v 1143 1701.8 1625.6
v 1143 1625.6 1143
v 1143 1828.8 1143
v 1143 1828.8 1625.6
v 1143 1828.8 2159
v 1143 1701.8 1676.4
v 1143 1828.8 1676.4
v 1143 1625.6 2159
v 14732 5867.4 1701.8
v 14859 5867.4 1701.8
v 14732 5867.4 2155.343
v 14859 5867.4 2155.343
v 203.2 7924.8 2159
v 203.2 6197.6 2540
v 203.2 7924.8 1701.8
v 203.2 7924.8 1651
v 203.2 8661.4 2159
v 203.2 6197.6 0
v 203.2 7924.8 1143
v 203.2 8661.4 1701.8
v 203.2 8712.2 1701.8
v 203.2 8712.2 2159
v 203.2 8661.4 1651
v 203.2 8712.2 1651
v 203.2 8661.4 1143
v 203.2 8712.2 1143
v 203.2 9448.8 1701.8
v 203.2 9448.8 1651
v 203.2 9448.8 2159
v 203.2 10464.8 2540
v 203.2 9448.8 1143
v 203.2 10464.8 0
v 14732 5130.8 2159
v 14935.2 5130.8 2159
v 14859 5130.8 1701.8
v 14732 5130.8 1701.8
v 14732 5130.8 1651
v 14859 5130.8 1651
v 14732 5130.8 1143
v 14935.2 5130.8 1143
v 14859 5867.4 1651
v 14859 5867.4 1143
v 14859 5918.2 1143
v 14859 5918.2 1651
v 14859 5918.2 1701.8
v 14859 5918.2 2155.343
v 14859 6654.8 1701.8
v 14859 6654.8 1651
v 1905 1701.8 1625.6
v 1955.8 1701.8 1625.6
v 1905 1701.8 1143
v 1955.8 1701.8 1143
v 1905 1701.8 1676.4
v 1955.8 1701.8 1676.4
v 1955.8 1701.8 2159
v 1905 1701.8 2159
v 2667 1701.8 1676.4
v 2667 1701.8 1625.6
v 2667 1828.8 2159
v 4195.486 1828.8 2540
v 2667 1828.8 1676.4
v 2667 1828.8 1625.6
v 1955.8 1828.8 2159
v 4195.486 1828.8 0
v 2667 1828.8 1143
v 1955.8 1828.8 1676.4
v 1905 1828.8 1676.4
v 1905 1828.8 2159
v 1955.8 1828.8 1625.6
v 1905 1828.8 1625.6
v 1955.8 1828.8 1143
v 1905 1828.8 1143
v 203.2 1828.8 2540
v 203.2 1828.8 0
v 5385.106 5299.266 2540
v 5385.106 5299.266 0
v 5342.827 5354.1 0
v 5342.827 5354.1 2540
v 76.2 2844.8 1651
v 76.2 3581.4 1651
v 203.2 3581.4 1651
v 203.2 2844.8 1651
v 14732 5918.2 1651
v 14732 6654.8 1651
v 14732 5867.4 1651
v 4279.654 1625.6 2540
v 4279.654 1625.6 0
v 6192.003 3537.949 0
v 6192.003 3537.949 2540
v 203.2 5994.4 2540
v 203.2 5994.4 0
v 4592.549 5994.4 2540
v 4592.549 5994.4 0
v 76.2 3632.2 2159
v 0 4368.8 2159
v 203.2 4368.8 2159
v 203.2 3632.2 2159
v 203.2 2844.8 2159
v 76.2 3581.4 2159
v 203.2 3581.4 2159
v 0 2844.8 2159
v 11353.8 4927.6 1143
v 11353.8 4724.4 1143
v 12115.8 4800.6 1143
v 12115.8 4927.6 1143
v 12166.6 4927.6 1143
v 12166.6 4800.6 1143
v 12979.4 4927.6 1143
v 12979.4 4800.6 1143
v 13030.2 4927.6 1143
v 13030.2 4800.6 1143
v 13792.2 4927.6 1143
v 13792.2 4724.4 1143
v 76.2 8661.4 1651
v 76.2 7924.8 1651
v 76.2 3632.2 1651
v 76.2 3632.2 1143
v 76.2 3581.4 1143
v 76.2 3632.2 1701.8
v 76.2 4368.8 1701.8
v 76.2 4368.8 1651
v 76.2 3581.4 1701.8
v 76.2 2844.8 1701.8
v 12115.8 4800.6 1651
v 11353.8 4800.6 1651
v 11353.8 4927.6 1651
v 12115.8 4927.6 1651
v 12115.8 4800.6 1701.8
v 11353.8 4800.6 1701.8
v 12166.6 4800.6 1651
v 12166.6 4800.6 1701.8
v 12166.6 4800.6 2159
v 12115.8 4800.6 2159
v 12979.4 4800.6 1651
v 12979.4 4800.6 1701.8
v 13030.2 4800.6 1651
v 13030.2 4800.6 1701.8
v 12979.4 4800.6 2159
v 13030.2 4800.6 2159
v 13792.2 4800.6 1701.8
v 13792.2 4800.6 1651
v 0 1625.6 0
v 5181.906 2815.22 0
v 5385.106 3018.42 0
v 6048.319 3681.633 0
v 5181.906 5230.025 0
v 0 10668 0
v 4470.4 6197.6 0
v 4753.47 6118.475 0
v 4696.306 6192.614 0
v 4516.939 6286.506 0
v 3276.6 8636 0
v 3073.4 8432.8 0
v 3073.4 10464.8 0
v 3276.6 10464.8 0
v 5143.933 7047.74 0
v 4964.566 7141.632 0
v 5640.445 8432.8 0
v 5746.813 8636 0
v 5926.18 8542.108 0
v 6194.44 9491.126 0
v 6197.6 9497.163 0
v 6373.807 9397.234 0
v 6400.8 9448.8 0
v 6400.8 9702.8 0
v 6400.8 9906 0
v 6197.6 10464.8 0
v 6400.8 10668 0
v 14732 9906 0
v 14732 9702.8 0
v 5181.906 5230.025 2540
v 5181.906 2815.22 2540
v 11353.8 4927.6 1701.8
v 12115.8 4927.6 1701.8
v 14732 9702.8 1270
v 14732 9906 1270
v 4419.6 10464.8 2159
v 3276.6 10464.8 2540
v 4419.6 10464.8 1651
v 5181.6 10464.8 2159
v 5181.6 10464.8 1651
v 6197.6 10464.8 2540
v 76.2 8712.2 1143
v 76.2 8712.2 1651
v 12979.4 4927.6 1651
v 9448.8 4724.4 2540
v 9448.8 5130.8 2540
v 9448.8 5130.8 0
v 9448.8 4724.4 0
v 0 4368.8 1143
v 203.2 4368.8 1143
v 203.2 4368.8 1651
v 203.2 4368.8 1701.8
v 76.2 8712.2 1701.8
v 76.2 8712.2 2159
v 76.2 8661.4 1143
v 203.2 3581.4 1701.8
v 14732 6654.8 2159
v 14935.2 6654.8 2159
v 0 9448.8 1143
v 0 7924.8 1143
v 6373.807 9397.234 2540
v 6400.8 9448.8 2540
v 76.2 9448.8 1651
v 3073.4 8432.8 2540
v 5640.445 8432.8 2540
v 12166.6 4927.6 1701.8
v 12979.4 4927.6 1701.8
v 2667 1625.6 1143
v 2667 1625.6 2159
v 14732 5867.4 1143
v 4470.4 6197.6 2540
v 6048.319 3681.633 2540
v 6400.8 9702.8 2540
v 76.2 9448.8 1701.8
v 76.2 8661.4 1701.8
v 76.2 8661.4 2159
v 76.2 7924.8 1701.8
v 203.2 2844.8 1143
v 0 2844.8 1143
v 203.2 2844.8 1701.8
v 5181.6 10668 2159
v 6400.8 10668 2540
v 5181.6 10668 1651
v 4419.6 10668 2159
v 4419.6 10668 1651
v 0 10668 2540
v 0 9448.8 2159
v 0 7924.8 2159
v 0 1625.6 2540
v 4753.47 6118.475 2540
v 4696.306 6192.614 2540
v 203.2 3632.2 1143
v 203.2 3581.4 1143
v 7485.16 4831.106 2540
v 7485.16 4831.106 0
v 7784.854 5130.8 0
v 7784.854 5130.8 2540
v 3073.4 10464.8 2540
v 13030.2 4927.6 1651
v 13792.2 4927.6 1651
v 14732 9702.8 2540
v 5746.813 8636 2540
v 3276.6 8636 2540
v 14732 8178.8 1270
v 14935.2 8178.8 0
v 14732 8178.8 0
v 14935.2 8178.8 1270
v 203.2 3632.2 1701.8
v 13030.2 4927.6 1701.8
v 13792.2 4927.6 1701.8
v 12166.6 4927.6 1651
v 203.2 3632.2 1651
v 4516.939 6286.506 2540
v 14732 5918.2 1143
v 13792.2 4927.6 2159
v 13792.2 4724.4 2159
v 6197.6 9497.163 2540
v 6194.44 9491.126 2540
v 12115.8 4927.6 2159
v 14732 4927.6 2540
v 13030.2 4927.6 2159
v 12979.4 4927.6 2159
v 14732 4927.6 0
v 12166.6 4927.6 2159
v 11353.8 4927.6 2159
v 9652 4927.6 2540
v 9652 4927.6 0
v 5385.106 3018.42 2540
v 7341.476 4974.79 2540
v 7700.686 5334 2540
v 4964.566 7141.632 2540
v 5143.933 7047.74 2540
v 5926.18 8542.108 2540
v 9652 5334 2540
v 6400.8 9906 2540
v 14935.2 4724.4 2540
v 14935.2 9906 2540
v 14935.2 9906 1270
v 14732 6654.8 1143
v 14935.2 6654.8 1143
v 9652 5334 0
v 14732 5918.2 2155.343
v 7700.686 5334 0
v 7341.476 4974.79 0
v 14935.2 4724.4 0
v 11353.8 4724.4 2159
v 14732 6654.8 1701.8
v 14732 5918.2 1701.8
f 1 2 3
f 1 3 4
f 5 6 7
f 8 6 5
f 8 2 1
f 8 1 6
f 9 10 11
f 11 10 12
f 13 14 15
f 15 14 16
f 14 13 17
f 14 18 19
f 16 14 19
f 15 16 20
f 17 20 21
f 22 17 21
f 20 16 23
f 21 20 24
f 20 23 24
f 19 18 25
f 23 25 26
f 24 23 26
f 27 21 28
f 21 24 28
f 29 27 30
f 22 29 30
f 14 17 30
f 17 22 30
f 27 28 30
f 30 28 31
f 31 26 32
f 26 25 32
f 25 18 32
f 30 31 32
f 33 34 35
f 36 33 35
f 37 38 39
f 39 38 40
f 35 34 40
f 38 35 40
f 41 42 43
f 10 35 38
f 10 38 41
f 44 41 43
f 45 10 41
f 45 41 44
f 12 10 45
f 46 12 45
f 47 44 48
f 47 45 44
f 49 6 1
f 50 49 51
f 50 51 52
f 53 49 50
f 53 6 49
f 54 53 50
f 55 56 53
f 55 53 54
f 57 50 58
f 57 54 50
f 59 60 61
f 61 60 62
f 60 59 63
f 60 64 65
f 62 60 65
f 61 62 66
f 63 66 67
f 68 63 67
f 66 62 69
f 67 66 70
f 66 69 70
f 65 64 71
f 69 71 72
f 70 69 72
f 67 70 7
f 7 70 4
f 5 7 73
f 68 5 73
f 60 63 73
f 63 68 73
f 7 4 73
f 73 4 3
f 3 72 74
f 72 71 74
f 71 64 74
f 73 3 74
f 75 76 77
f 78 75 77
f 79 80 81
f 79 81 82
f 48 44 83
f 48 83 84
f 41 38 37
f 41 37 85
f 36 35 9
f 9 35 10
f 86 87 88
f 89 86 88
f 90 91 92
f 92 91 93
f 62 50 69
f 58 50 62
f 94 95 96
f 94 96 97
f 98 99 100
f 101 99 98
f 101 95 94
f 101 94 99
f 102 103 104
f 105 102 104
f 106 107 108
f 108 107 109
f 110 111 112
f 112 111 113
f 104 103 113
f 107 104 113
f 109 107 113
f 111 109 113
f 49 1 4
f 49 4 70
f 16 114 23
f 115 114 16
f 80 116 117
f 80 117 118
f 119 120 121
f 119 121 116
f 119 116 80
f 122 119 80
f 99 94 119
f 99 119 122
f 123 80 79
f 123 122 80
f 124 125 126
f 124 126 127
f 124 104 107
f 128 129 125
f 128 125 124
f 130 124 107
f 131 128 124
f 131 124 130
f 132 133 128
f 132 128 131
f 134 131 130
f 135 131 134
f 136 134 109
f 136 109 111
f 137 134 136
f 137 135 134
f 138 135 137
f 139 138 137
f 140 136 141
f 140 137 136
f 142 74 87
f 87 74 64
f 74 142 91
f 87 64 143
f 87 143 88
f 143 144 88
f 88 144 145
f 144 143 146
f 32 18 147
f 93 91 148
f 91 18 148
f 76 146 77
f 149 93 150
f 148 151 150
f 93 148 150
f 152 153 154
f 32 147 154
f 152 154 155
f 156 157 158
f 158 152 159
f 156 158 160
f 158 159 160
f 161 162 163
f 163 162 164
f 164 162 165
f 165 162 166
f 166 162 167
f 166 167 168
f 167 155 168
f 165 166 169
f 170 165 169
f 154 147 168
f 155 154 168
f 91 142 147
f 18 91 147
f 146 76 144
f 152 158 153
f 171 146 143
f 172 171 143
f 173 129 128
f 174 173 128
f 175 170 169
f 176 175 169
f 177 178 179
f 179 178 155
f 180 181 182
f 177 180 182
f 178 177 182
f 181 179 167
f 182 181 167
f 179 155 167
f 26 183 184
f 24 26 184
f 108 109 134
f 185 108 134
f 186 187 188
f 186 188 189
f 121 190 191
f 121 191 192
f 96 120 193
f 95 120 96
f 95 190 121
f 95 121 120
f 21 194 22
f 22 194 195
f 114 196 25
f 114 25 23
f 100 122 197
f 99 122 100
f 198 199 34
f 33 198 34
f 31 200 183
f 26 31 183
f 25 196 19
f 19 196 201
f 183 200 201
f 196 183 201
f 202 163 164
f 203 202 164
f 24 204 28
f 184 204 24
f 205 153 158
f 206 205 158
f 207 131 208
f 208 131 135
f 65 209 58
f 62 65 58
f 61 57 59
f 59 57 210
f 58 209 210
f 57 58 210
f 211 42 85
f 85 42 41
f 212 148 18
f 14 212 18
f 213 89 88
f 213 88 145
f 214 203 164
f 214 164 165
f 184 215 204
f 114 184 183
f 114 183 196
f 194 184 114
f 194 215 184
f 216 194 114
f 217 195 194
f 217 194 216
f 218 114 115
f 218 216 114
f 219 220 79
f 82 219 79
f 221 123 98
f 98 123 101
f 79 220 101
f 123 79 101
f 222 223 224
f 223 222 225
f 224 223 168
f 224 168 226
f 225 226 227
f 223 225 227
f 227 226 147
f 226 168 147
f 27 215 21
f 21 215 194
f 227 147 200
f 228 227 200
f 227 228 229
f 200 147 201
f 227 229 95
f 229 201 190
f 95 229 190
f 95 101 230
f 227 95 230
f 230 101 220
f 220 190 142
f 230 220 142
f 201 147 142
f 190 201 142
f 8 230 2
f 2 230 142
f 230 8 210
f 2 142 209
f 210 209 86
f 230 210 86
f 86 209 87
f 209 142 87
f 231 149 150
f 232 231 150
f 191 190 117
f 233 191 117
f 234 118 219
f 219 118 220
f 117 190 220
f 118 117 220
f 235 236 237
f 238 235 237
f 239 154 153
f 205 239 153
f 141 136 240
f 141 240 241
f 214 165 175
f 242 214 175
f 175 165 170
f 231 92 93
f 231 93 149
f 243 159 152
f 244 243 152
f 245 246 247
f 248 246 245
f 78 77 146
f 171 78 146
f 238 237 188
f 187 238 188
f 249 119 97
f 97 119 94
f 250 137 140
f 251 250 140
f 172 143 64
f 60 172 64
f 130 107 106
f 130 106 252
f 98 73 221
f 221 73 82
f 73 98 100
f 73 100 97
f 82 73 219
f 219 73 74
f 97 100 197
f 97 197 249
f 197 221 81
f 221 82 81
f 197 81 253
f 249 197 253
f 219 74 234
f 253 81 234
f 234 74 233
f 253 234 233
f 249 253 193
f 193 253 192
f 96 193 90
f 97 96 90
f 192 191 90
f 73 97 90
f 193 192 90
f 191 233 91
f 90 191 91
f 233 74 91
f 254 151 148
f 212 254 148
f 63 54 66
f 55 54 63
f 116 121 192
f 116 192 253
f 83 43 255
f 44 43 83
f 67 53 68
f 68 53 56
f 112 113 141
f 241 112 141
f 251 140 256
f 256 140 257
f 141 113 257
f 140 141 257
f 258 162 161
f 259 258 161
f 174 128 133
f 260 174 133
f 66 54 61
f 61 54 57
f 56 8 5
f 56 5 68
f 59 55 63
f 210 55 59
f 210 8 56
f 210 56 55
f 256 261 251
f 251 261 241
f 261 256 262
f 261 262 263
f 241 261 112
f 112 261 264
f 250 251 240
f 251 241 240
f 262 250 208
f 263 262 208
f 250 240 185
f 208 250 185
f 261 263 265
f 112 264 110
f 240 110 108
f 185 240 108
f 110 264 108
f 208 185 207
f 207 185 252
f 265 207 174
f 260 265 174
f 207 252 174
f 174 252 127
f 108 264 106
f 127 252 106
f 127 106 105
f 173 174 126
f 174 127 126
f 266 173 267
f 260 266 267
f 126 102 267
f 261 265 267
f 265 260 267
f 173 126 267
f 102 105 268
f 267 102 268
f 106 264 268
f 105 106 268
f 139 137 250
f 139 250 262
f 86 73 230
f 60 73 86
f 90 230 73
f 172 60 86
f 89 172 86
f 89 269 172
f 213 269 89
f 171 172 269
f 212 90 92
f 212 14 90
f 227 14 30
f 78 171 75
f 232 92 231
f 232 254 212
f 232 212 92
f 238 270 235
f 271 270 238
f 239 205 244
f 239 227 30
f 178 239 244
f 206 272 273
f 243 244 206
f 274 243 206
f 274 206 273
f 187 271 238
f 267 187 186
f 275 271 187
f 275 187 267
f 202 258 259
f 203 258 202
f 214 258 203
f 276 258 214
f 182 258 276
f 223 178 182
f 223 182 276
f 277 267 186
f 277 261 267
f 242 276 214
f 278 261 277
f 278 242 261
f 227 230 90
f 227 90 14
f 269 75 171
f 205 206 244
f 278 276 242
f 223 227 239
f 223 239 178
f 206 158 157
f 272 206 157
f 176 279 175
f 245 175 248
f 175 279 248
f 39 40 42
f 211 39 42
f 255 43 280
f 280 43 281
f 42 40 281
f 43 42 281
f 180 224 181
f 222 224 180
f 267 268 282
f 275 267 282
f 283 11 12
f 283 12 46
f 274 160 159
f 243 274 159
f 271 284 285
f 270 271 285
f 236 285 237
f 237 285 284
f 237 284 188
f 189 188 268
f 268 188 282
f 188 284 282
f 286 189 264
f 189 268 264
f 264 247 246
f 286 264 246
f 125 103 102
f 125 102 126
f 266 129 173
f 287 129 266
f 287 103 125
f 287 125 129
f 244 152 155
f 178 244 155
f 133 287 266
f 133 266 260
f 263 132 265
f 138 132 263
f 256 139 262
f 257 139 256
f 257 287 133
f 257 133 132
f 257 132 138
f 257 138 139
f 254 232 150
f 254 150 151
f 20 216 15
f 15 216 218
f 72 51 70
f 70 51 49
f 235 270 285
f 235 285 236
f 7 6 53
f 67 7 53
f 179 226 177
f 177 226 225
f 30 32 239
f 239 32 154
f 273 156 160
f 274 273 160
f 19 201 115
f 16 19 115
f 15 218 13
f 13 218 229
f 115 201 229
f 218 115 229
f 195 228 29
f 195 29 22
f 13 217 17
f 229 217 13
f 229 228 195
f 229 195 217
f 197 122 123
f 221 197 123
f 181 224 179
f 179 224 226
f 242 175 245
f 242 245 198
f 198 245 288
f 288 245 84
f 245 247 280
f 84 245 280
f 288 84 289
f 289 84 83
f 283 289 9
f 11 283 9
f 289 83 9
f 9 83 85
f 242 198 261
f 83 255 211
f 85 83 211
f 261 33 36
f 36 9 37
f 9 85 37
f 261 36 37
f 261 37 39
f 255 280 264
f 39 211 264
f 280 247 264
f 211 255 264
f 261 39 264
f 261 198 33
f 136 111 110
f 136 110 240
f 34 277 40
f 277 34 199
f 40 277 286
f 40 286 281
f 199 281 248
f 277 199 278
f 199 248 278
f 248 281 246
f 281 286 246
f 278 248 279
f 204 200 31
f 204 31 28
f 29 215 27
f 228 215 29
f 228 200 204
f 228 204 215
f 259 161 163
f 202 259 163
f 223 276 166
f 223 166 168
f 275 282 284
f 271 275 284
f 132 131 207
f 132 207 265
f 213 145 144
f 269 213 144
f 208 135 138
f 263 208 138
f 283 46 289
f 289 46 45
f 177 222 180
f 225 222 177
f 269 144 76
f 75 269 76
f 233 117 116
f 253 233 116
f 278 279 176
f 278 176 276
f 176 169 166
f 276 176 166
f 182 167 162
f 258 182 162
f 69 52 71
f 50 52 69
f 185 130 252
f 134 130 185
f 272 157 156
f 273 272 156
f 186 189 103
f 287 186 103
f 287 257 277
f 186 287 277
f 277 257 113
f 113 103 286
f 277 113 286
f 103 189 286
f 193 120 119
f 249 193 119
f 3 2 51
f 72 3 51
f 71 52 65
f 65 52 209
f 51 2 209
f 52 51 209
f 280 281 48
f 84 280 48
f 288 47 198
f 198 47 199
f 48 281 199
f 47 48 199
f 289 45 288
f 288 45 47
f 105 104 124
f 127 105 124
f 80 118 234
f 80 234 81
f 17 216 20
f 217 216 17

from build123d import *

# Parameters (mm, degrees)
F1_DEPTH  = 2540
F2_W      = 736.6
F2_H      = 457.2
F2_H_2    = 508
F3_DEPTH  = 203.2
F4_W      = 1524
F4_H      = 1016
F5_DEPTH  = 76.2
F6_W      = 762
F6_H      = 482.6
F6_W_2    = 711.2
F7_DEPTH  = 203.2
F8_W      = 1524
F8_H      = 1016
F9_DEPTH  = 76.2
F10_W     = 762
F10_H     = 457.2
F10_W_2   = 812.8
F10_H_2   = 508
F11_DEPTH = 203.2
F12_W     = 2438.4
F12_H     = 1016
F13_DEPTH = 76.2
F14_W     = 762
F14_H     = 508
F15_DEPTH = 203.2
F16_W     = 203.2
F16_H     = 1270
F16_W_2   = 1524
F17_DEPTH = 203.2
F18_W     = 736.6
F18_H     = 508
F19_DEPTH = 203.2
F20_W     = 1524
F20_H     = 1016
F21_DEPTH = 76.2


# Not quite as in the source:
# - ends of sketch curves that miss each other by under 0.0002 mm in the source are joined


with BuildPart() as f1:
    # F0 (on Top) → F1 (new body)
    with BuildSketch(Plane.XY):
        Polygon((0, 10668), (0, 1625.6), (4279.6544454742, 1625.6), (6192.0032212604, 3537.9487757862), (6048.3191233233, 3681.6328737233), (5385.1059684, 3018.4197188), (5385.1059684, 5299.2660923905), (5342.8269923446, 5354.1003717159), (5181.9059684, 5230.0251362632), (5181.9059684, 2815.2197188), (4195.4862496, 1828.8), (2071.3068791001, 1828.8), (203.2, 1828.8), (203.2, 5994.4), (4592.5486, 5994.4), (4753.4696239446, 6118.4752354526), (4696.3063146823, 6192.6139483473), (4516.9390764162, 6286.5061031958), (4470.4, 6197.6), (203.2, 6197.6), (203.2, 10464.8), (3073.4, 10464.8), (3073.4, 8432.8), (5640.4450235294, 8432.8), (4964.5662461846, 7141.6323844462), (5143.9334844506, 7047.7402295977), (5926.1799912072, 8542.1078451515), (5746.8127529412, 8636), (3276.6, 8636), (3276.6, 10464.8), (6197.6, 10464.8), (6197.6, 9702.8), (6197.6, 9497.163147027), (6194.4399227095, 9491.1262812504), (6373.8071609756, 9397.2341264019), (6400.8, 9448.8), (6400.8, 9702.8), (14732, 9702.8), (14732, 4927.6), (9652, 4927.6), (9652, 5334), (7700.6862496, 5334), (7341.4760047572, 4974.7897551572), (7485.1601026943, 4831.1056572201), (7784.8544454742, 5130.8), (9448.8, 5130.8), (9448.8, 4724.4), (14935.2, 4724.4), (14935.2, 9906), (6400.8, 9906), (6400.8, 10668), align=None)
    extrude(amount=F1_DEPTH)

    # F2 (on face) → F3 (cut)
    with BuildSketch(Plane(origin=(0, 0, 0), x_dir=(0, -1, 0), z_dir=(-1, 0, 0))):
        with Locations((-9080.5, 1930.4)):
            Rectangle(F2_W, F2_H)
        with Locations((-8293.1, 1930.4)):
            Rectangle(F2_W, F2_H)
        with Locations((-9080.5, 1397)):
            Rectangle(F2_W, F2_H_2)
        with Locations((-8293.1, 1397)):
            Rectangle(F2_W, F2_H_2)
        with Locations((-4000.5, 1930.4)):
            Rectangle(F2_W, F2_H)
        with Locations((-3213.1, 1930.4)):
            Rectangle(F2_W, F2_H)
        with Locations((-4000.5, 1397)):
            Rectangle(F2_W, F2_H_2)
        with Locations((-3213.1, 1397)):
            Rectangle(F2_W, F2_H_2)
    extrude(amount=-F3_DEPTH, mode=Mode.SUBTRACT)

    # F4 (on face) → F5 (cut)
    with BuildSketch(Plane(origin=(0, 0, 0), x_dir=(0, -1, 0), z_dir=(-1, 0, 0))):
        with Locations((-8686.8, 1651)):
            Rectangle(F4_W, F4_H)
        with Locations((-3606.8, 1651)):
            Rectangle(F4_W, F4_H)
    extrude(amount=-F5_DEPTH, mode=Mode.SUBTRACT)

    # F6 (on face) → F7 (cut)
    with BuildSketch(Plane.XZ.offset(-1625.6)):
        with Locations((1524, 1917.7)):
            Rectangle(F6_W, F6_H)
        with Locations((2311.4, 1917.7)):
            Rectangle(F6_W_2, F6_H)
        with Locations((1524, 1384.3)):
            Rectangle(F6_W, F6_H)
        with Locations((2311.4, 1384.3)):
            Rectangle(F6_W_2, F6_H)
    extrude(amount=-F7_DEPTH, mode=Mode.SUBTRACT)

    # F8 (on face) → F9 (cut)
    with BuildSketch(Plane.XZ.offset(-1625.6)):
        with Locations((1905, 1651)):
            Rectangle(F8_W, F8_H)
    extrude(amount=-F9_DEPTH, mode=Mode.SUBTRACT)

    # F10 (on face) → F11 (cut)
    with BuildSketch(Plane.XZ.offset(-4724.4)):
        with Locations((11734.8, 1930.4)):
            Rectangle(F10_W, F10_H)
        with Locations((12573, 1930.4)):
            Rectangle(F10_W_2, F10_H)
        with Locations((13411.2, 1930.4)):
            Rectangle(F10_W, F10_H)
        with Locations((11734.8, 1397)):
            Rectangle(F10_W, F10_H_2)
        with Locations((12573, 1397)):
            Rectangle(F10_W_2, F10_H_2)
        with Locations((13411.2, 1397)):
            Rectangle(F10_W, F10_H_2)
    extrude(amount=-F11_DEPTH, mode=Mode.SUBTRACT)

    # F12 (on face) → F13 (cut)
    with BuildSketch(Plane.XZ.offset(-4724.4)):
        with Locations((12573, 1651)):
            Rectangle(F12_W, F12_H)
    extrude(amount=-F13_DEPTH, mode=Mode.SUBTRACT)

    # F14 (on face) → F15 (cut)
    with BuildSketch(Plane(origin=(0, 10668, 0), x_dir=(-1, 0, 0), z_dir=(0, 1, 0))):
        with Locations((-4800.6, 1905)):
            Rectangle(F14_W, F14_H)
    extrude(amount=-F15_DEPTH, mode=Mode.SUBTRACT)

    # F16 (on face) → F17 (cut)
    with BuildSketch(Plane.YZ.offset(14935.2)):
        with Locations((9804.4, 635)):
            Rectangle(F16_W, F16_H)
        with Locations((8940.8, 635)):
            Rectangle(F16_W_2, F16_H)
    extrude(amount=-F17_DEPTH, mode=Mode.SUBTRACT)

    # F18 (on face) → F19 (cut)
    with BuildSketch(Plane.YZ.offset(14935.2)):
        Polygon((6654.8, 2159), (5130.8, 2159), (5130.8, 1701.8), (5867.4, 1701.8), (5867.4, 2155.3428173065), (5918.2, 2155.3428173065), (5918.2, 1701.8), (6654.8, 1701.8), align=None)
        with Locations((5499.1, 1397)):
            Rectangle(F18_W, F18_H)
        with Locations((6286.5, 1397)):
            Rectangle(F18_W, F18_H)
    extrude(amount=-F19_DEPTH, mode=Mode.SUBTRACT)

    # F20 (on face) → F21 (cut)
    with BuildSketch(Plane.YZ.offset(14935.2)):
        with Locations((5892.8, 1651)):
            Rectangle(F20_W, F20_H)
    extrude(amount=-F21_DEPTH, mode=Mode.SUBTRACT)


solid = f1.part
